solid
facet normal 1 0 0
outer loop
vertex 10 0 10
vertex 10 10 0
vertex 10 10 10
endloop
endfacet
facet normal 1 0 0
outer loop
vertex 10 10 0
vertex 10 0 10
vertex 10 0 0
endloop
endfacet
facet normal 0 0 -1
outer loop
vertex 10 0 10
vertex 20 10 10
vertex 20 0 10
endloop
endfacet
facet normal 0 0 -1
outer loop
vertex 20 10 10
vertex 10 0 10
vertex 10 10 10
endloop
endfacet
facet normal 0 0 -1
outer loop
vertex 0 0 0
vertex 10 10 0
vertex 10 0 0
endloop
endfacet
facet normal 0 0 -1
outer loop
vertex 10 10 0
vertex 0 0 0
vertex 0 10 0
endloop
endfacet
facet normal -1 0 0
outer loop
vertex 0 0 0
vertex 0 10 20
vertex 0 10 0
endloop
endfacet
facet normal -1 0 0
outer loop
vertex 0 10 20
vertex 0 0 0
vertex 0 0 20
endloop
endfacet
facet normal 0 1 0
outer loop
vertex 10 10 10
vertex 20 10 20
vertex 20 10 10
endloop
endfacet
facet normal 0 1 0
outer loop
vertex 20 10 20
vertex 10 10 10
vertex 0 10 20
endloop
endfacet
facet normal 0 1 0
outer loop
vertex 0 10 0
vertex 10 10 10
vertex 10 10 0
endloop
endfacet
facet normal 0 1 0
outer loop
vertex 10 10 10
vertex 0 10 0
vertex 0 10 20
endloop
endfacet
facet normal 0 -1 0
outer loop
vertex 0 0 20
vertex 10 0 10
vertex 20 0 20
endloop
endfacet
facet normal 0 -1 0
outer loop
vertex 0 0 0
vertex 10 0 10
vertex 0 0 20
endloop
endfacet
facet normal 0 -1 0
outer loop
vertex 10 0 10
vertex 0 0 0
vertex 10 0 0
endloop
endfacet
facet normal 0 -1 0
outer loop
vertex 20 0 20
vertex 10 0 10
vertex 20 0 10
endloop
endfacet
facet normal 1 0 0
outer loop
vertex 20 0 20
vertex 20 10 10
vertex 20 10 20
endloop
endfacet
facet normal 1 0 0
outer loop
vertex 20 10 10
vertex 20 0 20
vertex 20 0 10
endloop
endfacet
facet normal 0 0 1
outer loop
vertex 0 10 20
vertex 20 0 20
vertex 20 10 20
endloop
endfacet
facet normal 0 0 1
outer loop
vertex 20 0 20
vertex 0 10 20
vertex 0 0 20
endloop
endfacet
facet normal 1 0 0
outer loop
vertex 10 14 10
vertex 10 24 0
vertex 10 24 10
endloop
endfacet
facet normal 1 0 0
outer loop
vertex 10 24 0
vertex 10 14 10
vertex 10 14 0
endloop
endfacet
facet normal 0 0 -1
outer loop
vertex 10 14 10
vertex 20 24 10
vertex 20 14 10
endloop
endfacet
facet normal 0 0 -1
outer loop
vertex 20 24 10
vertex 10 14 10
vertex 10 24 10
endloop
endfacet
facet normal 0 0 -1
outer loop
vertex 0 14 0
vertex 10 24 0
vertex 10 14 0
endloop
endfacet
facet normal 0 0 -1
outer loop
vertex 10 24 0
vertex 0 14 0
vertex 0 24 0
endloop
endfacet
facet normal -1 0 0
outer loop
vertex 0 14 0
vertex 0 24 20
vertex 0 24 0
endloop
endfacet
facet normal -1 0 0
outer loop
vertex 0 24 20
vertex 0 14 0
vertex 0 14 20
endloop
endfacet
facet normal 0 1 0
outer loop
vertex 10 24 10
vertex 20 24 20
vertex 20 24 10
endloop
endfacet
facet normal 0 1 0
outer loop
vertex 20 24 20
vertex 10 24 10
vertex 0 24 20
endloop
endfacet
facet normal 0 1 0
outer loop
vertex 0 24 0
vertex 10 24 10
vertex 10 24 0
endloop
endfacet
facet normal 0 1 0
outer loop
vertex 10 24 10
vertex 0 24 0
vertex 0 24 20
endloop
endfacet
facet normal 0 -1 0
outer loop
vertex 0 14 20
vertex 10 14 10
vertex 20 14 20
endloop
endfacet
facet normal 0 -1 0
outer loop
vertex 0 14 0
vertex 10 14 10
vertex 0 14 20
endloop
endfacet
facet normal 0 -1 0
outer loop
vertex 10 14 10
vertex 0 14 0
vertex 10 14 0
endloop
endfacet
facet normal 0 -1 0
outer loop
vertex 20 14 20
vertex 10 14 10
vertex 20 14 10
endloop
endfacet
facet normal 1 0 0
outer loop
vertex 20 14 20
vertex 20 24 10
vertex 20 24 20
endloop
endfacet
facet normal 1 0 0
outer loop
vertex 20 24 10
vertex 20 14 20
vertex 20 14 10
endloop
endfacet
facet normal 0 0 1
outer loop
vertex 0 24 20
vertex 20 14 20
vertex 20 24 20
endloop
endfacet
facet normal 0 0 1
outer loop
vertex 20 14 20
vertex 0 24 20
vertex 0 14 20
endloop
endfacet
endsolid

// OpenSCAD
module overhang() {
	cube(10);
	translate([0, 0, 10]) {
		cube([20, 10, 10]);
	}
}

overhang();
translate([0, 14, 0]) {
	overhang();
}
